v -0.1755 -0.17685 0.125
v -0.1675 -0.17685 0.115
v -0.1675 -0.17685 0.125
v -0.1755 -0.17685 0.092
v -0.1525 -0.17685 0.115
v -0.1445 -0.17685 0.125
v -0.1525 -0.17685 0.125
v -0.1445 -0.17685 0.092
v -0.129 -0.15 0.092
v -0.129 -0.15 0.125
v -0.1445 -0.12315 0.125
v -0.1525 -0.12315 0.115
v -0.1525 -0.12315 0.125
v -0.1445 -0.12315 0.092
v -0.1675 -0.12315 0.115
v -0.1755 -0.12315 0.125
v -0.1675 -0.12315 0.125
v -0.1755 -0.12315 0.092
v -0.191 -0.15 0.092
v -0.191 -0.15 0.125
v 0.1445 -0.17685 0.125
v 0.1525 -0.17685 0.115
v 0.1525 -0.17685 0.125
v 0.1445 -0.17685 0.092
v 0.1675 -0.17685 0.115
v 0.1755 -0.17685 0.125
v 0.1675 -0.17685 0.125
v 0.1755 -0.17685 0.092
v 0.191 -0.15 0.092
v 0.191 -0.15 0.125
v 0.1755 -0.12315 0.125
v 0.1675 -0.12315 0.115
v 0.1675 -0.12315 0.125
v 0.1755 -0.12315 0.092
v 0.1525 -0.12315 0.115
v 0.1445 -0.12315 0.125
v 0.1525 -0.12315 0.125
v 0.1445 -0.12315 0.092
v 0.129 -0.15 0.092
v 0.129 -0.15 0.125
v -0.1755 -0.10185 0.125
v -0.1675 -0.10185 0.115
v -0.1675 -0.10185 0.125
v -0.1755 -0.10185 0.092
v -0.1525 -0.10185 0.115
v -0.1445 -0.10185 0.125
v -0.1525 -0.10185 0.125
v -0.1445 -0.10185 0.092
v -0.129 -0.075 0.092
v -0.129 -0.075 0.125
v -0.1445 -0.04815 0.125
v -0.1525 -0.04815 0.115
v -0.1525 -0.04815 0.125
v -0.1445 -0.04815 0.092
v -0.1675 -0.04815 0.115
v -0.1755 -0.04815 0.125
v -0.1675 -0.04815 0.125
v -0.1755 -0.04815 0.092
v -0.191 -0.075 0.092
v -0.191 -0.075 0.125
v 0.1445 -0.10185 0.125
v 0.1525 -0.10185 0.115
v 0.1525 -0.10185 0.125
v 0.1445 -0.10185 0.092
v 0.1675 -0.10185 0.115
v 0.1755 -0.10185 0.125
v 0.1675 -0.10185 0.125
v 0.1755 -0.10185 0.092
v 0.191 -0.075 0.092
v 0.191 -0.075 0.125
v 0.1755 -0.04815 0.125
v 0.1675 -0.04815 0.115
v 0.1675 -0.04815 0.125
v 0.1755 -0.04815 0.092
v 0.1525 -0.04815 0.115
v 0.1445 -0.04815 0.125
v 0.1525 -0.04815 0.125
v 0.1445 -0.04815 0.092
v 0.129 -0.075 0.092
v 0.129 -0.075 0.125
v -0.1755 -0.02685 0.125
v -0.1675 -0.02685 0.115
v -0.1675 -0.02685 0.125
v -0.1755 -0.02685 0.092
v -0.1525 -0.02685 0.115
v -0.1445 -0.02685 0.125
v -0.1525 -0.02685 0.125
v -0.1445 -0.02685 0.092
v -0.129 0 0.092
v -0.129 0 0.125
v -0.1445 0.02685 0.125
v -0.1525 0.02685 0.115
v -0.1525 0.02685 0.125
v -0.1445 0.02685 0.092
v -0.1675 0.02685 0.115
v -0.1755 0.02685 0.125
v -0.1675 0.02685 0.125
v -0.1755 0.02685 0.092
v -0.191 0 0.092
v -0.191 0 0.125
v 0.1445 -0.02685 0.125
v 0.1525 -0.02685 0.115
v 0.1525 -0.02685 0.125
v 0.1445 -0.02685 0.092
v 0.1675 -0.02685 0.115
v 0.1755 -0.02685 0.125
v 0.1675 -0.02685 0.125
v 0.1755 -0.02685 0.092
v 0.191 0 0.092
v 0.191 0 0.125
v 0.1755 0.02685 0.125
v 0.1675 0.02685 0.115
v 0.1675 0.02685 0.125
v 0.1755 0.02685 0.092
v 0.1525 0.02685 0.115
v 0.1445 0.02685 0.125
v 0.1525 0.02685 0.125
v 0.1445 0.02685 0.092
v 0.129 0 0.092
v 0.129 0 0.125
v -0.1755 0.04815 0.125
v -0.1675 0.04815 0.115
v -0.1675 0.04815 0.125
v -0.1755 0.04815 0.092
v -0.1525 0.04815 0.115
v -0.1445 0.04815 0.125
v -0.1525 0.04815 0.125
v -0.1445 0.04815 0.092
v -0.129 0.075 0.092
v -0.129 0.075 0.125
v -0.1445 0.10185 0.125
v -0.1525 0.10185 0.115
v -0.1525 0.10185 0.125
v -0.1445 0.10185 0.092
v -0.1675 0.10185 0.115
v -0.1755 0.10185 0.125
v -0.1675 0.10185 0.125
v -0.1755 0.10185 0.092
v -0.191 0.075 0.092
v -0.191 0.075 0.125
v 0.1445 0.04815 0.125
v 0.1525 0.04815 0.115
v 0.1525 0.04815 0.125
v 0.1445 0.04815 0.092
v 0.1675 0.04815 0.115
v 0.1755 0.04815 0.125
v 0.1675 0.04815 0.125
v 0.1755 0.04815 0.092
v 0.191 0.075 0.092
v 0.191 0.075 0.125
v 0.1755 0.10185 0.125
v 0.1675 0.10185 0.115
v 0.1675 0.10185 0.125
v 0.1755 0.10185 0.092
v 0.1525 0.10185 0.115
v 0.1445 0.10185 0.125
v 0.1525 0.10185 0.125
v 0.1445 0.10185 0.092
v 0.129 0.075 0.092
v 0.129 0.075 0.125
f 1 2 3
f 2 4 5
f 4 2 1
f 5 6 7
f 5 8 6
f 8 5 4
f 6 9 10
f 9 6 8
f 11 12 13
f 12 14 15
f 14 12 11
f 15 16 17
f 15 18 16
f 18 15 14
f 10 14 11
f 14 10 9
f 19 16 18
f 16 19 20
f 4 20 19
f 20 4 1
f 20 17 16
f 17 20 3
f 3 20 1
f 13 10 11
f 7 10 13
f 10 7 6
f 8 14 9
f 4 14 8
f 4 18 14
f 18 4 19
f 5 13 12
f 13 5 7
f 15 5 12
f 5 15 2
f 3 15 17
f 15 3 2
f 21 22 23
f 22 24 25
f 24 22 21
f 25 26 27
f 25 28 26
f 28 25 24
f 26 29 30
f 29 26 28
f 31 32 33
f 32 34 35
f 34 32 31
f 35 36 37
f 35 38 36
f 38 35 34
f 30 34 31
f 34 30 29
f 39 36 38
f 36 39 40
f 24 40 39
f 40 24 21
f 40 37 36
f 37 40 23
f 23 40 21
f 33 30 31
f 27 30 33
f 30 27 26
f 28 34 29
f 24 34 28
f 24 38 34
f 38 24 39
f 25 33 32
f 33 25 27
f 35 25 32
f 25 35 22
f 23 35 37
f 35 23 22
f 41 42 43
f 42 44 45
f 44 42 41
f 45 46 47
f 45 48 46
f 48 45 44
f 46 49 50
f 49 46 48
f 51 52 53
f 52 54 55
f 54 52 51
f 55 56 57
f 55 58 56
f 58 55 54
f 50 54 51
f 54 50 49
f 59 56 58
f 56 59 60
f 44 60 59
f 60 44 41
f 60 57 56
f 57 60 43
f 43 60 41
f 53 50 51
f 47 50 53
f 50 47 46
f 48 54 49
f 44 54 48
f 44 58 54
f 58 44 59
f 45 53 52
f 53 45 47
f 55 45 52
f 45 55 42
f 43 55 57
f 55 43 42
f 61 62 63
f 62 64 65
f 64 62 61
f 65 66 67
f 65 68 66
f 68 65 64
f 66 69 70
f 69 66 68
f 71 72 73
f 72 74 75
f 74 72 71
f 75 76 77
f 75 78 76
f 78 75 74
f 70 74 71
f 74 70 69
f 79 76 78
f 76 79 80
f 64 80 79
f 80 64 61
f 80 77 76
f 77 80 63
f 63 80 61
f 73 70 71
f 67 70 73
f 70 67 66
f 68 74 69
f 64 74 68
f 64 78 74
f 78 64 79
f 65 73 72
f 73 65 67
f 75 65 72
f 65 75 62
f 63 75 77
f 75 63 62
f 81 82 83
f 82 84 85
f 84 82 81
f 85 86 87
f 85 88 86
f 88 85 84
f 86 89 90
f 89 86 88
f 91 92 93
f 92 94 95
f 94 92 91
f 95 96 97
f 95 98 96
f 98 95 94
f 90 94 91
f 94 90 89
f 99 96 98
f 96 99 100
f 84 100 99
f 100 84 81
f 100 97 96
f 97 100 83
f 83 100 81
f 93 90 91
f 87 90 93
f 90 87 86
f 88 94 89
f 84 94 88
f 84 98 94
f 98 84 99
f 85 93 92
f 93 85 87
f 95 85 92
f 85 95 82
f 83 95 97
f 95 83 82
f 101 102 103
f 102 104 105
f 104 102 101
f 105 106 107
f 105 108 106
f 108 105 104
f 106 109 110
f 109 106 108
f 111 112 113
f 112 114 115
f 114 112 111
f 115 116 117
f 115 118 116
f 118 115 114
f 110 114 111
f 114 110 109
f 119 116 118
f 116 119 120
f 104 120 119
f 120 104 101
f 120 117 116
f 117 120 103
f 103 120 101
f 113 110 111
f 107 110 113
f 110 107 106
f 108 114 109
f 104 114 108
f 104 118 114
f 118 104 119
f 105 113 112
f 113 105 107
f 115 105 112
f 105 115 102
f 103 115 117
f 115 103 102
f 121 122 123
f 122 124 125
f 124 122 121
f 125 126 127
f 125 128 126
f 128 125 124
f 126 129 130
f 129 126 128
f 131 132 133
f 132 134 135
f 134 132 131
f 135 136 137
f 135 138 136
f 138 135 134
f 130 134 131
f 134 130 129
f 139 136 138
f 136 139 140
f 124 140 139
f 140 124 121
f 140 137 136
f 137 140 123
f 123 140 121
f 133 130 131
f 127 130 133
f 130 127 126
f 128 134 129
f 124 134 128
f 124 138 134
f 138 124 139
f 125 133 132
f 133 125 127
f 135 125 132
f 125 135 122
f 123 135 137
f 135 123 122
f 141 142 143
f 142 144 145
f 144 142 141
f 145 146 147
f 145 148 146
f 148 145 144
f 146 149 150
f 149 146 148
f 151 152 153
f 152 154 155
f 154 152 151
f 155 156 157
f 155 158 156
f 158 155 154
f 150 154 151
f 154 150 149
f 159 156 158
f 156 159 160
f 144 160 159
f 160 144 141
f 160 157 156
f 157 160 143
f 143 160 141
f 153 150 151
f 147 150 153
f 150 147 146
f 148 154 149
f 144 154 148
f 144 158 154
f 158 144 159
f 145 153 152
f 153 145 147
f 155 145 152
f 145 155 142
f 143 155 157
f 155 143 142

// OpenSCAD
// file: Text_shared.scad
char_depth = 0.0001;

char_pixelsz = 0.02/5;
char_pheight = 5;
char_max_pwidth = 5;

function sum(list) = list * [for (_=list) 1];
function partialsum(list, end) = list * [for (i=[0:len(list)-1]) i < end ? 1 : 0];

module _Text_Line(a, b) {
  l = norm(b-a);
  f = l > 0 ? (b-a)/l : [1, 0];
  r = [f.y, -f.x];
  ea = -0.5*f;
  eb = (l+0.5)*f;
  sr = 0.5*r;
  sl = -sr;
  polygon([
    a+ea+sr,
    a+eb+sr,
    a+eb+sl,
    a+ea+sl,
  ]*char_pixelsz);
}

module _Text_Segments(pts, off=[0,0]) {
  for (i=[0:len(pts)-2]) {
    pa = pts[i];
    pb = pts[i+1];
    if (len(pa) == 2 && len(pb) == 2)
      _Text_Line(pts[i]+off, pts[i+1]+off);
  }
}

_Letters = [
  [[-2, -2], [-2, 2], [2, 2], [2, -2], [2, 0], [-2, 0]], // A
  [], // B
  [[2, -2], [-2, -2], [-2, 2], [2, 2]], // C
  [[2, 0.5], [2, -2], [-2, -2], [-2, 2], [0.5, 2], [], [3, 0], [0, 3]], // D
  [[2, -2], [-2, -2], [-2, 2], [2, 2], [], [-2, 0], [0, 0]], // E
  [[2, 2], [-2, 2], [-2, -2], [-2, 0], [0, 0]], // F
  [[0, 0], [2, 0], [2, -2], [-2, -2], [-2, 2], [2, 2]], // G
  [], // H
  [[0, -2], [0, 2]], // I
  [], // J
  [], // K
  [[-2, 2], [-2, -2], [2, -2]], // L
  [], // M
  [], // N
  [[-2, -2], [-2, 2], [2, 2], [2, -2], [-2, -2]], // O
  [[-2, -2], [-2, 2], [2, 2], [2, 0], [-2, 0]], // P
  [], // Q
  [[-2, -2], [-2, 2], [2, 2], [2, 0], [-2, 0], [1, -3]], // R
  [], // S
  [], // T
  [], // U
  [], // V
  [], // W
  [], // X
  [], // Y
  [], // Z
  [[-2, 2], [2, 2], [2, 0], [0, 0], [], [0, -2], [0, -2]], // ? for missing
];

function _Letter_Lookup(c) =
  let(
    ci=ord(c),
    li=ci-ord("A"),
    issp=ci==32,
    lps=li>=0&&li<26 ? _Letters[li] : [],
    lpf=len(lps)==0 ? _Letters[26] : lps
  ) issp ? [] : lpf;

function _Letter_Bounds(letter) =
  let(
    fletter = concat([[0, 0]], [for (l=letter) len(l)==2 ? l : [0,0]]),
    xs = [for (l=fletter) l.x],
    ys = [for (l=fletter) l.y]
  ) [min(xs), min(ys), max(xs), max(ys)];

module Text(letters) {
  lbounds = [for (l=letters) _Letter_Bounds(l)];
  lwidths = [for (b=lbounds) min(b.z-b.x+1, char_max_pwidth)];
  lmins = [for (b=lbounds) b.x];
  twid = sum(lwidths) + len(letters)-1;
  startoff = (1-twid)/2;
  offs = [for (i=[0:len(letters)-1]) startoff+i+partialsum(lwidths, i)];
  linear_extrude(height=char_depth) {
    for (i=[0:len(letters)-1]) if (len(letters[i]) > 0) {
      letter = letters[i];
      off = offs[i];
      left = off-lmins[i];
      wid = lwidths[i];
      intersection() {
        _Text_Segments(letter, [left, 0]);
        scale([char_pixelsz,char_pixelsz]) translate([off-0.5, -char_pheight/2])
          square(size=[wid, char_pheight]);
      }
    }
  }
}

module Text(text) {
  letters = [for (c=text) _Letter_Lookup(c)];
  lbounds = [for (l=letters) _Letter_Bounds(l)];
  lwidths = [for (b=lbounds) min(b.z-b.x+1, char_max_pwidth)];
  lmins = [for (b=lbounds) b.x];
  twid = sum(lwidths) + len(letters)-1;
  startoff = (1-twid)/2;
  offs = [for (i=[0:len(letters)-1]) startoff+i+partialsum(lwidths, i)];
  linear_extrude(height=char_depth) {
    for (i=[0:len(letters)-1]) if (len(letters[i]) > 0) {
      letter = letters[i];
      off = offs[i];
      left = off-lmins[i];
      wid = lwidths[i];
      intersection() {
        _Text_Segments(letter, [left, 0]);
        scale([char_pixelsz,char_pixelsz]) translate([off-0.5, -char_pheight/2])
          square(size=[wid, char_pheight]);
      }
    }
  }
}
// file: DataSymbol.scad
boxSize = 0.029;
lineSize = 0.0045;
symDepth = 0.01;
vertSeparation = 0.019;
horizSeparation = 0.018;

module DataSymbol() {
  boxVertCenter = (boxSize+vertSeparation)/2;
  boxHorizCenter = (boxSize+horizSeparation)/2;
  linear_extrude(symDepth, center=true) {
    translate([0,boxVertCenter]) square(boxSize, center=true); // top box
    translate([-boxHorizCenter,-boxVertCenter]) square(boxSize, center=true); // bottom left box
    translate([boxHorizCenter,-boxVertCenter]) square(boxSize, center=true); // bottom right box
    square([2*boxHorizCenter + lineSize, lineSize], center=true); // middle line
    translate([0, horizSeparation/4]) square([lineSize, horizSeparation/2 + lineSize], center=true); // line to top
    translate([-boxHorizCenter, -horizSeparation/4]) square([lineSize, horizSeparation/2 + lineSize], center=true); // line to bottom left
    translate([boxHorizCenter, -horizSeparation/4]) square([lineSize, horizSeparation/2 + lineSize], center=true); // line to bottom right
  }
}

DataSymbol();
// file: PowerSymbol.scad
symWidth = 0.038;
symHeight = 0.086;
symDepth = 0.01;
middleHeight = 0.0075;
topHorizOffset = 0.007;
sideVertOffset = 0.007;

module PowerSymbol() {
  linear_extrude(symDepth, center=true) {
    halfHei = symHeight/2;
    halfWid = symWidth/2;
    halfMid = middleHeight/2;
    polygon([
      [topHorizOffset, halfHei],
      [0, halfMid],
      [halfWid, sideVertOffset],
      [-topHorizOffset, -halfHei],
      [0, -halfMid],
      [-halfWid, -sideVertOffset]
    ]);
  }
}

PowerSymbol();
// file: FPGAHousing_base.scad
include <FPGA_shared.scad>;
use <FPGAHousing_paintcap.scad>;
use <PowerSymbol.scad>;
use <DataSymbol.scad>;

module FPGAHousing_chipcutout() {
  slotPinBaseOffset = (-slotPinEdgeCount-1)/2 * slotPinEdgeSpacing;
  slotPinEdgeOffset = slotSize/2 - slotPinSize/2 - slotPinEdgePad;
  union() {
    translate([0, 0, baseDepth/2 + slotBottom + slotPinDepth]) {
      cube(size=[slotSize, slotSize, baseDepth], center=true);
    }
    for(edge=[1:4]) rotate([0,0,90*edge]) {
      for(i=[1:slotPinEdgeCount]) {
        translate([
          slotPinBaseOffset + slotPinEdgeSpacing*i,
          slotPinEdgeOffset,
          slotBottom + slotPinDepth
        ]) {
          cube(size=[slotPinSize, slotPinSize, slotPinDepth*2], center=true);
        }
      }
    }
    translate([alignHoleOffset,alignHoleOffset,slotBottom + slotPinDepth])
      cylinder(h=alignHoleDepth*2, r=alignHoleRadius, center=true, $fn=alignHoleSides);
  }
}

module FPGAHousing_base() {
  middleSize = (slotSize + capSize) / 2;
  difference() {
    union() {
      translate([0,0,baseCenter])
        cube(size=[baseSize, baseSize, baseDepth], center=true);
      translate([0,0,baseTop-eps])
        cube(size=[middleSize, middleSize, capDepth*2], center=true);
    }
    translate([0,0,baseBottom])
      cube(size=[baseBackCutoutSize, baseBackCutoutSize, baseBackCutoutDepth*2], center=true);
    FPGAHousing_chipcutout();
  }
}

FPGAHousing_base();
%FPGAHousing_paintcap();
// file: Text_FPGAREADER.scad
include <Text_shared.scad>;

module Text_FPGAREADER() {
  Text("FPGA READER");
}

Text_FPGAREADER();
// file: FPGAHousing_paintcap.scad
include <FPGA_shared.scad>;
use <FPGAHousing_base.scad>;

module FPGAHousing_paintcap() {
  bevelDepth = capBevel * sqrt(2);
  difference() {
    translate([0,0,baseTop]) {
      cube(size=[capSize, capSize, capDepth*2], center=true);
    }
    cube(size=[slotSize+eps*10, slotSize+eps*10, smallGridSize], center=true);
    for (edge=[1:4]) rotate([0,0,90*edge]) {
      translate([0,capSize/2,baseTop+capDepth]) rotate([45,0,0])
        cube(size=[capSize+0.1, bevelDepth, bevelDepth*2], center=true);
    }
  }
}

%FPGAHousing_base();
FPGAHousing_paintcap();
// file: FPGAHousing_readerbase.scad
include <FPGA_shared.scad>;
use <FPGAHousing_base.scad>;
use <FPGAHousing_paintcap.scad>;
use <PowerSymbol.scad>;
use <DataSymbol.scad>;

module FPGAHousing_readerbase() {
  difference() {
    FPGAHousing_base();
    cablecutout();
    rotate([0,0,90]) cablecutout();
    rotate([0,0,-90]) cablecutout();
  }
}

FPGAHousing_readerbase();
%FPGAHousing_paintcap();
%translate([0.067,0.25,-0.001]) rotate([-90, 0, 0]) PowerSymbol();
%translate([-0.25,0.073,0.001]) rotate([90, 0, 90]) DataSymbol();
%translate([0.25,0.073,0.001]) rotate([90, 0, -90]) DataSymbol();
// file: ConfigScrew.scad
screw_radius = 0.031;
screw_height = 0.030;

notch_width = 0.015;
notch_depth = 0.010;

module ConfigScrew() {
  difference() {
    translate([0,0,screw_height*0.45])
      cylinder(h=screw_height*1.1, r=screw_radius, center=true, $fn=6);
    translate([0,0,screw_height])
      cube([notch_width, screw_radius*3, notch_depth*2], center=true);
  }
}

ConfigScrew();
// file: FPGA_shared.scad
smallGridSize = 0.5;
baseSize = smallGridSize;
baseTop = 0.05;
baseBottom = -0.045;
baseDepth = baseTop - baseBottom;
baseCenter = (baseTop + baseBottom)/2;
baseBackRim = 0.02;
baseBackCutoutSize = baseSize - baseBackRim*2;
baseBackCutoutDepth = 0.01;
capSize = 0.41;
capDepth = 0.045;
capBevel = 0.01;
slotSize = smallGridSize * 0.5;
slotBottom = 0.03;
slotPinEdgeCount = 4;
slotPinEdgePad = 0.01;
slotPinEdgeSpacing = 0.045;
slotPinSize = 0.025;
slotPinDepth = 0.025;
eps = 0.00001;
chipTotalSize = slotSize - slotPinEdgePad*2 - slotPinSize/2;
chipTotalHeight = 0.1;
chipBaseHeight = 0.05;
pinHorizLength = 0.022;
pinHorizUnderLength = 0.008;
pinHorizWidth = 0.02;
pinHorizHeight = 0.015;
pinVertInnerOffset = 0.003;
pinVertOuterOffset = 0.003;
pinVertNarrowOffset = 0.003;
pinTotalHeight = chipTotalHeight - chipBaseHeight/2 + pinHorizHeight/2;
chipBaseSize = chipTotalSize - pinHorizLength*2;
chipBaseBevelSize = 0.005;
alignHoleRadius = 0.005;
alignHoleOffset = chipBaseSize/2 - 0.02;
alignHoleDepth = 0.005;
alignHoleSides = 8;
decoPinCount = 8;
decoPinWidth = 0.036;
decoPinLength = 0.034;
decoPinHeight = 0.028;
decoPinSpacing = 0.049;
decoPinBevelSize = 0.010;

module cablecutout() {
  cableradius = 0.025;
  cableDepth = 0.0125;
  translate([0,smallGridSize/2,0]) rotate([90,0,0]) {
    cylinder(h=cableDepth*2, r=cableradius, center=true, $fn=8);
  }
}
// main file
include <FPGA_shared.scad>;
use <ConfigScrew.scad>;
use <FPGAHousing_readerbase.scad>;
use <FPGAHousing_paintcap.scad>;
use <Text_FPGAREADER.scad>;

screw_offset = 0.16;
screw_spacing = 0.075;

module FPGAHousing_readerscrews() {
  for (sy=[-2:1]) for (sx=[-1:2:1]) translate([sx*screw_offset,sy*screw_spacing,capDepth+baseTop]) {
    ConfigScrew();
  }
}

FPGAHousing_readerscrews();
%FPGAHousing_readerbase();
%FPGAHousing_paintcap();
%translate([0,0.16,0.095]) Text_FPGAREADER();
